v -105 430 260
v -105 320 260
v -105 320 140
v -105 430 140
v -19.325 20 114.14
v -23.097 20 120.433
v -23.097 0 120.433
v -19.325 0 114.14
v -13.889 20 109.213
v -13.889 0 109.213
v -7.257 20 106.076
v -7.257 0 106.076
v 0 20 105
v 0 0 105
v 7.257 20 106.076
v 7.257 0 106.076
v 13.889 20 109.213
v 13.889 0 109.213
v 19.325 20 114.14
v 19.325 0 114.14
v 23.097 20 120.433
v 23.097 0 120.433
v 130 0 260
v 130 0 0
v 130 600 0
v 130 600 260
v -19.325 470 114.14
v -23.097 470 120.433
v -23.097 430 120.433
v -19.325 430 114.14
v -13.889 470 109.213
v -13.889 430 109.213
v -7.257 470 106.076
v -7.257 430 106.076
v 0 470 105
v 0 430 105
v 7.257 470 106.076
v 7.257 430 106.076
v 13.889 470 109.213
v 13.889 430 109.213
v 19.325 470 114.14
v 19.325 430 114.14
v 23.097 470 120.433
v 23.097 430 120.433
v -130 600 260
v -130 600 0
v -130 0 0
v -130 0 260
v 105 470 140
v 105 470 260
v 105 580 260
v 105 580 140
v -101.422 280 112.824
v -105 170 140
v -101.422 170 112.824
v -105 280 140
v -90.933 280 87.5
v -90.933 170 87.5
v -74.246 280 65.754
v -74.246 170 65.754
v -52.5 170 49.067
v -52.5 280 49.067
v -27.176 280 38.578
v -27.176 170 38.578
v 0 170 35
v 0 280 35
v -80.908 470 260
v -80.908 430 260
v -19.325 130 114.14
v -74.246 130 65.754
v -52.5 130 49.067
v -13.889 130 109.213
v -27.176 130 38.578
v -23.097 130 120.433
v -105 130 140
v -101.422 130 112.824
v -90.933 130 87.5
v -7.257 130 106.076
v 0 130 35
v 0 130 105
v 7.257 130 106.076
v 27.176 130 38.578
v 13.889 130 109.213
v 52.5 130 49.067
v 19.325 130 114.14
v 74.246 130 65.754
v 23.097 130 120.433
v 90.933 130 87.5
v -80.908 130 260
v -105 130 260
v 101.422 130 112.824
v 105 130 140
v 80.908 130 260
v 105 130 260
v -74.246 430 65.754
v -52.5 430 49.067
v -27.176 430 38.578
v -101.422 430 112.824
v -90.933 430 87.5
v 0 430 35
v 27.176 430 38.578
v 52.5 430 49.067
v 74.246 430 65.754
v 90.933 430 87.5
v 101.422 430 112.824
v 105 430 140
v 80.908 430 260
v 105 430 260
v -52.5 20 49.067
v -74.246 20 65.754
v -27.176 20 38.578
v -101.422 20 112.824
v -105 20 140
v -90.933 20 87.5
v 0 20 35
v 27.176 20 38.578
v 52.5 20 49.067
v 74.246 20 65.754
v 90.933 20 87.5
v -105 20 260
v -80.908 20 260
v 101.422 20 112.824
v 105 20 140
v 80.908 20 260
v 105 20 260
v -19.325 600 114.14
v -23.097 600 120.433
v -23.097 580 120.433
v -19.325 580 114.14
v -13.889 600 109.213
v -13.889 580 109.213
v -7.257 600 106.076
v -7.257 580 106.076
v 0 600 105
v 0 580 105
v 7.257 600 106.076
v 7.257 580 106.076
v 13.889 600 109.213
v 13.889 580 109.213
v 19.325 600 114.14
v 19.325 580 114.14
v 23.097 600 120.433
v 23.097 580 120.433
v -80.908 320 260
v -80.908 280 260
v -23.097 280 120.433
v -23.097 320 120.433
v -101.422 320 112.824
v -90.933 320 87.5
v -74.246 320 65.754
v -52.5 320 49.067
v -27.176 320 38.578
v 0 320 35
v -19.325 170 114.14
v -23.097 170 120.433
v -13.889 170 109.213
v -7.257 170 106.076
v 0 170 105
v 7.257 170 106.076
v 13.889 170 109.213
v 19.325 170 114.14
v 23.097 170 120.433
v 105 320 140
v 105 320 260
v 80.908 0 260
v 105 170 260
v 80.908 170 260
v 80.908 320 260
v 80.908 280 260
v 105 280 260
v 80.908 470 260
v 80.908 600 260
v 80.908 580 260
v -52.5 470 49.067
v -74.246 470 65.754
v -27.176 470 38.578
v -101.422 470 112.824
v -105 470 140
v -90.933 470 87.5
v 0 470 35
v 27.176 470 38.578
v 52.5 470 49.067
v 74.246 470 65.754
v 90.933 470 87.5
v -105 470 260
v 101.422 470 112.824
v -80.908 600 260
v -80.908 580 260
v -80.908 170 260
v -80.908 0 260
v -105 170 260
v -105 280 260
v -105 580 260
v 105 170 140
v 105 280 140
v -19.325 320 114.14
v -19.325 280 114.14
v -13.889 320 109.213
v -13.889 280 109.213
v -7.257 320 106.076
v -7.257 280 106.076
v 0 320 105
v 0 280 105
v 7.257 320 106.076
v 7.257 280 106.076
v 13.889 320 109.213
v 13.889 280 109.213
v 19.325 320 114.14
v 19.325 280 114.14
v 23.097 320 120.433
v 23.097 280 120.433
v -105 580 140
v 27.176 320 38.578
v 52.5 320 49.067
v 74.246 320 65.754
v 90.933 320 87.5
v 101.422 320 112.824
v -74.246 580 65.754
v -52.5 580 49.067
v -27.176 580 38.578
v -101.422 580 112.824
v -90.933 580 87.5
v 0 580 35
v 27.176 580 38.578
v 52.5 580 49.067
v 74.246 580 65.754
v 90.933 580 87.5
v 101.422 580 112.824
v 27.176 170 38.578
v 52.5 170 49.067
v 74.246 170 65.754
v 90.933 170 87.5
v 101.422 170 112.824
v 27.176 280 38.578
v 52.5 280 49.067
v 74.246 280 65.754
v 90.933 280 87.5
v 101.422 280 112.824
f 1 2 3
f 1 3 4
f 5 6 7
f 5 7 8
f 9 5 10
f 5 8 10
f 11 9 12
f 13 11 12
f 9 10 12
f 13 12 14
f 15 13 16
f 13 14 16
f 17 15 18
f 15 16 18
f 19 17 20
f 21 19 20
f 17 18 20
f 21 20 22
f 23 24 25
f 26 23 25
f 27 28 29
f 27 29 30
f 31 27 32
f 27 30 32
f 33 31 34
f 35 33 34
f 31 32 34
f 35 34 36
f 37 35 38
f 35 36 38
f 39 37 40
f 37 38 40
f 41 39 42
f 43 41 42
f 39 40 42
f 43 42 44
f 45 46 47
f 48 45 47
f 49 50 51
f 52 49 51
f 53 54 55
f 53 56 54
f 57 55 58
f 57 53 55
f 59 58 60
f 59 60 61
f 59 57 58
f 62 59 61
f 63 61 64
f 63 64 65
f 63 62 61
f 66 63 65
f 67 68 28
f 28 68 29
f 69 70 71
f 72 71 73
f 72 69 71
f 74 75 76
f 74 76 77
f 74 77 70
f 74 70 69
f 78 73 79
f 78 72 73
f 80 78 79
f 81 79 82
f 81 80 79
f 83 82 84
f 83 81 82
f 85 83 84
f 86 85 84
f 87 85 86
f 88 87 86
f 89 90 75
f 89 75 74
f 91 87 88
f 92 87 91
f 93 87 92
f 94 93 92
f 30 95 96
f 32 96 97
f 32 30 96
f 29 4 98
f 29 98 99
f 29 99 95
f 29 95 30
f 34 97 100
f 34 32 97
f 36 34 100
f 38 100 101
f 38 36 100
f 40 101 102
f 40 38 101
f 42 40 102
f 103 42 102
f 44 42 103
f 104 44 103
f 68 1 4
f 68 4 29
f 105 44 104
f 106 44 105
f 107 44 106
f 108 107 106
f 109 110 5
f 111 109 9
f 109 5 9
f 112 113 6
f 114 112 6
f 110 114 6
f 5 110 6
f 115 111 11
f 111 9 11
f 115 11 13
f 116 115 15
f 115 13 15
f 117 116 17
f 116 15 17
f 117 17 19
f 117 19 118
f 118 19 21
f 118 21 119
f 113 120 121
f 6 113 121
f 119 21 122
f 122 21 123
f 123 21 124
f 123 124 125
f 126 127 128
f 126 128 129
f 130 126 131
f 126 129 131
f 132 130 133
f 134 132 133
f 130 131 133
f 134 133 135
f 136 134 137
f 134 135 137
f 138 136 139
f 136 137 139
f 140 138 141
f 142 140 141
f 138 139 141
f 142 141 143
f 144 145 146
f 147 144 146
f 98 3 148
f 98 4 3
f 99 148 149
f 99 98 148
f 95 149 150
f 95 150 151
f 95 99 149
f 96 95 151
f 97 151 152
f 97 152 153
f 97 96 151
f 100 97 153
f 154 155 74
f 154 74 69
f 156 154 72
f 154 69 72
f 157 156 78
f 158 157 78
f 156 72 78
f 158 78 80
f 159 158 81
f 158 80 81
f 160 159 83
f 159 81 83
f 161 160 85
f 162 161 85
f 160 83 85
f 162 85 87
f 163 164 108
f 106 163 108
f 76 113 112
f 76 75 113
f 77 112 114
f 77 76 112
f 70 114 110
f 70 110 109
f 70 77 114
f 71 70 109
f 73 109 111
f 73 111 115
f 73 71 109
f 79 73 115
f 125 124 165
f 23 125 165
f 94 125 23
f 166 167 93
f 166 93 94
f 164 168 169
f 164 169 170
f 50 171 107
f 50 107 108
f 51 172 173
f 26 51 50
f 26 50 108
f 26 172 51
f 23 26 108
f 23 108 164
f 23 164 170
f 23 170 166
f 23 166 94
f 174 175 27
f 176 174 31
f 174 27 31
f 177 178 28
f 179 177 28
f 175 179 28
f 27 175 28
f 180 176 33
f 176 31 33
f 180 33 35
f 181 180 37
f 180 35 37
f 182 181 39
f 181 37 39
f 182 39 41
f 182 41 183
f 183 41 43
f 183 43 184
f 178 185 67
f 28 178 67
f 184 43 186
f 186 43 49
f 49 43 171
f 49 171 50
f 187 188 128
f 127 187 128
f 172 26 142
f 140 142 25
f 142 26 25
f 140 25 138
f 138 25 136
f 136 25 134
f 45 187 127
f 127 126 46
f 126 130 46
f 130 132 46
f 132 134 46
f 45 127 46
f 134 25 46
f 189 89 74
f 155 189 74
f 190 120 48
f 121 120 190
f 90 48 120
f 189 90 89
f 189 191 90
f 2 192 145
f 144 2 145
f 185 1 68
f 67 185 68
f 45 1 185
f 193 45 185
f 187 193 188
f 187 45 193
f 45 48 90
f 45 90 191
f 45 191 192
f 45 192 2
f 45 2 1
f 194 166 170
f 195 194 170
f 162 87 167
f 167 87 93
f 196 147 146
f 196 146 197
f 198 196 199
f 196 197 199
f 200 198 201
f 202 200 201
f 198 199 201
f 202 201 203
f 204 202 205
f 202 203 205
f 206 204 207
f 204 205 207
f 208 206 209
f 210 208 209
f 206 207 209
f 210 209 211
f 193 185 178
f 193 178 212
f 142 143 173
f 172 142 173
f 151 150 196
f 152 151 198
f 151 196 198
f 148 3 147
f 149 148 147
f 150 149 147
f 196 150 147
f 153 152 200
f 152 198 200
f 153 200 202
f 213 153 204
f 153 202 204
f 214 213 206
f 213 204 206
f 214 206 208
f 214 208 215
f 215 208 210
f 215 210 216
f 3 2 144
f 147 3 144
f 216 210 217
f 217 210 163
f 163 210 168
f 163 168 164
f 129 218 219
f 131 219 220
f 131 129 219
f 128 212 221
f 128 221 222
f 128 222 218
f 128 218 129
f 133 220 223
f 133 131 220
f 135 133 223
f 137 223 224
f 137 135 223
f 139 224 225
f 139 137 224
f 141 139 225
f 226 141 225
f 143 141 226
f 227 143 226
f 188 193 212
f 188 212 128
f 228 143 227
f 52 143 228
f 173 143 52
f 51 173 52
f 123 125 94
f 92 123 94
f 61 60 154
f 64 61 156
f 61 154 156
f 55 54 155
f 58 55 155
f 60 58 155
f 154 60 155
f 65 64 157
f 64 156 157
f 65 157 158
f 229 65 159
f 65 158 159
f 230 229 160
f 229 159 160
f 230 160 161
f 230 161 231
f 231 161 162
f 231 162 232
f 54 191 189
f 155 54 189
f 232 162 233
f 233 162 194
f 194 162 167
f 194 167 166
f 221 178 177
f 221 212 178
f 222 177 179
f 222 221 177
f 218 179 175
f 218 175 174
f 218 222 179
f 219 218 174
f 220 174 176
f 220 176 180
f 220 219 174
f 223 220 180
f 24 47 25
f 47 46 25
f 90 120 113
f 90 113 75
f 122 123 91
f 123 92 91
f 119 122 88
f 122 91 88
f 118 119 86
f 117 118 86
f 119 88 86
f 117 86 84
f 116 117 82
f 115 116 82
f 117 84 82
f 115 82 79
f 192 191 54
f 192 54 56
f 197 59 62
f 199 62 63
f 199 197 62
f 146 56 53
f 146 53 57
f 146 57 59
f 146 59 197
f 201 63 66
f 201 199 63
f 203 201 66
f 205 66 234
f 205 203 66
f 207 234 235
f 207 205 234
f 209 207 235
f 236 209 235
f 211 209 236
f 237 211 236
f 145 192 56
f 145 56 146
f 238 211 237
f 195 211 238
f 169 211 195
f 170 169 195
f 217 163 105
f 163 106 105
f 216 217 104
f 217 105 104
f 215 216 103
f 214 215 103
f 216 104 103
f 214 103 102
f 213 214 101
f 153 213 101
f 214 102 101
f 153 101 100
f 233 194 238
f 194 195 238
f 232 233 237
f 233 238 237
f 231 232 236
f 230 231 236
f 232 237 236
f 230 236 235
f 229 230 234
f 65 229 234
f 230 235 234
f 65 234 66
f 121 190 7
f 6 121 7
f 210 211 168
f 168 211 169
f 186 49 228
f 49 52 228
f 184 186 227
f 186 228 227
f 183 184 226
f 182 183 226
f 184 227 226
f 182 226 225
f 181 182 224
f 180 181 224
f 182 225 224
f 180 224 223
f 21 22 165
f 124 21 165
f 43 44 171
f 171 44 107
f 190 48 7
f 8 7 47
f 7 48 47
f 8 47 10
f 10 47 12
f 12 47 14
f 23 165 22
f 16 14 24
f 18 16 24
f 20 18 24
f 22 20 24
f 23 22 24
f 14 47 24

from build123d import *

# Parameters (mm, degrees)
F1_DEPTH = 260
F2_W     = 210
F2_H     = 110
F3_DEPTH = 225
F4_R     = 104.99999
F6_DEPTH = 600.001


# Not quite as in the source:
# - a fillet or chamfer is up to 0.001 mm smaller than in the source, because OpenCascade refuses the exact size


with BuildPart() as f1:
    # F0 (on Top) → F1 (new body)
    with BuildSketch(Plane.XY):
        Polygon((-130, 0), (0, 0), (130, 0), (130, 600), (-130, 600), align=None)
    extrude(amount=F1_DEPTH)

    # F2 (on face) → F3 (cut)
    with BuildSketch(Plane.XY.offset(260)):
        with Locations((0, 525)):
            Rectangle(F2_W, F2_H)
        with Locations((0, 225)):
            Rectangle(F2_W, F2_H)
        with Locations((0, 375)):
            Rectangle(F2_W, F2_H)
        with Locations((0, 75)):
            Rectangle(F2_W, F2_H)
    extrude(amount=-F3_DEPTH, mode=Mode.SUBTRACT)

    # F4 (radius 105 in the source; OpenCascade refuses exactly that, so slightly less here)
    f4_edges = [f1.edges().sort_by_distance(p)[0] for p in [
        (-105, 75, 35),
        (105, 75, 35),
        (-105, 225, 35),
        (-105, 375, 35),
        (-105, 525, 35),
        (105, 225, 35),
        (105, 375, 35),
        (105, 525, 35),
    ]]
    fillet(f4_edges, radius=F4_R)

    # F5 (on face) → F6 (cut, through all)
    with BuildSketch(Plane.XZ):
        with BuildLine():
            ThreePointArc((23.0969883128, 120.4329141909), (24.5196320101, 125.1227419496), (25, 130))
            ThreePointArc((25, 130), (-4.8772580504, 154.5196320101), (-23.0969883128, 120.4329141909))
            ThreePointArc((-23.0969883128, 120.4329141909), (0, 105), (23.0969883128, 120.4329141909))
        make_face()
        with BuildLine():
            ThreePointArc((-23.0969883128, 120.4329141909), (-4.8772580504, 154.5196320101), (25, 130))
            ThreePointArc((25, 130), (24.5196320101, 125.1227419496), (23.0969883128, 120.4329141909))
            Line((23.0969883128, 120.4329141909), (80.9075681158, 260))
            Line((80.9075681158, 260), (0, 260))
            Line((0, 260), (-80.9075681158, 260))
            Line((-80.9075681158, 260), (-23.0969883128, 120.4329141909))
        make_face()
    extrude(amount=-F6_DEPTH, mode=Mode.SUBTRACT)


solid = f1.part
